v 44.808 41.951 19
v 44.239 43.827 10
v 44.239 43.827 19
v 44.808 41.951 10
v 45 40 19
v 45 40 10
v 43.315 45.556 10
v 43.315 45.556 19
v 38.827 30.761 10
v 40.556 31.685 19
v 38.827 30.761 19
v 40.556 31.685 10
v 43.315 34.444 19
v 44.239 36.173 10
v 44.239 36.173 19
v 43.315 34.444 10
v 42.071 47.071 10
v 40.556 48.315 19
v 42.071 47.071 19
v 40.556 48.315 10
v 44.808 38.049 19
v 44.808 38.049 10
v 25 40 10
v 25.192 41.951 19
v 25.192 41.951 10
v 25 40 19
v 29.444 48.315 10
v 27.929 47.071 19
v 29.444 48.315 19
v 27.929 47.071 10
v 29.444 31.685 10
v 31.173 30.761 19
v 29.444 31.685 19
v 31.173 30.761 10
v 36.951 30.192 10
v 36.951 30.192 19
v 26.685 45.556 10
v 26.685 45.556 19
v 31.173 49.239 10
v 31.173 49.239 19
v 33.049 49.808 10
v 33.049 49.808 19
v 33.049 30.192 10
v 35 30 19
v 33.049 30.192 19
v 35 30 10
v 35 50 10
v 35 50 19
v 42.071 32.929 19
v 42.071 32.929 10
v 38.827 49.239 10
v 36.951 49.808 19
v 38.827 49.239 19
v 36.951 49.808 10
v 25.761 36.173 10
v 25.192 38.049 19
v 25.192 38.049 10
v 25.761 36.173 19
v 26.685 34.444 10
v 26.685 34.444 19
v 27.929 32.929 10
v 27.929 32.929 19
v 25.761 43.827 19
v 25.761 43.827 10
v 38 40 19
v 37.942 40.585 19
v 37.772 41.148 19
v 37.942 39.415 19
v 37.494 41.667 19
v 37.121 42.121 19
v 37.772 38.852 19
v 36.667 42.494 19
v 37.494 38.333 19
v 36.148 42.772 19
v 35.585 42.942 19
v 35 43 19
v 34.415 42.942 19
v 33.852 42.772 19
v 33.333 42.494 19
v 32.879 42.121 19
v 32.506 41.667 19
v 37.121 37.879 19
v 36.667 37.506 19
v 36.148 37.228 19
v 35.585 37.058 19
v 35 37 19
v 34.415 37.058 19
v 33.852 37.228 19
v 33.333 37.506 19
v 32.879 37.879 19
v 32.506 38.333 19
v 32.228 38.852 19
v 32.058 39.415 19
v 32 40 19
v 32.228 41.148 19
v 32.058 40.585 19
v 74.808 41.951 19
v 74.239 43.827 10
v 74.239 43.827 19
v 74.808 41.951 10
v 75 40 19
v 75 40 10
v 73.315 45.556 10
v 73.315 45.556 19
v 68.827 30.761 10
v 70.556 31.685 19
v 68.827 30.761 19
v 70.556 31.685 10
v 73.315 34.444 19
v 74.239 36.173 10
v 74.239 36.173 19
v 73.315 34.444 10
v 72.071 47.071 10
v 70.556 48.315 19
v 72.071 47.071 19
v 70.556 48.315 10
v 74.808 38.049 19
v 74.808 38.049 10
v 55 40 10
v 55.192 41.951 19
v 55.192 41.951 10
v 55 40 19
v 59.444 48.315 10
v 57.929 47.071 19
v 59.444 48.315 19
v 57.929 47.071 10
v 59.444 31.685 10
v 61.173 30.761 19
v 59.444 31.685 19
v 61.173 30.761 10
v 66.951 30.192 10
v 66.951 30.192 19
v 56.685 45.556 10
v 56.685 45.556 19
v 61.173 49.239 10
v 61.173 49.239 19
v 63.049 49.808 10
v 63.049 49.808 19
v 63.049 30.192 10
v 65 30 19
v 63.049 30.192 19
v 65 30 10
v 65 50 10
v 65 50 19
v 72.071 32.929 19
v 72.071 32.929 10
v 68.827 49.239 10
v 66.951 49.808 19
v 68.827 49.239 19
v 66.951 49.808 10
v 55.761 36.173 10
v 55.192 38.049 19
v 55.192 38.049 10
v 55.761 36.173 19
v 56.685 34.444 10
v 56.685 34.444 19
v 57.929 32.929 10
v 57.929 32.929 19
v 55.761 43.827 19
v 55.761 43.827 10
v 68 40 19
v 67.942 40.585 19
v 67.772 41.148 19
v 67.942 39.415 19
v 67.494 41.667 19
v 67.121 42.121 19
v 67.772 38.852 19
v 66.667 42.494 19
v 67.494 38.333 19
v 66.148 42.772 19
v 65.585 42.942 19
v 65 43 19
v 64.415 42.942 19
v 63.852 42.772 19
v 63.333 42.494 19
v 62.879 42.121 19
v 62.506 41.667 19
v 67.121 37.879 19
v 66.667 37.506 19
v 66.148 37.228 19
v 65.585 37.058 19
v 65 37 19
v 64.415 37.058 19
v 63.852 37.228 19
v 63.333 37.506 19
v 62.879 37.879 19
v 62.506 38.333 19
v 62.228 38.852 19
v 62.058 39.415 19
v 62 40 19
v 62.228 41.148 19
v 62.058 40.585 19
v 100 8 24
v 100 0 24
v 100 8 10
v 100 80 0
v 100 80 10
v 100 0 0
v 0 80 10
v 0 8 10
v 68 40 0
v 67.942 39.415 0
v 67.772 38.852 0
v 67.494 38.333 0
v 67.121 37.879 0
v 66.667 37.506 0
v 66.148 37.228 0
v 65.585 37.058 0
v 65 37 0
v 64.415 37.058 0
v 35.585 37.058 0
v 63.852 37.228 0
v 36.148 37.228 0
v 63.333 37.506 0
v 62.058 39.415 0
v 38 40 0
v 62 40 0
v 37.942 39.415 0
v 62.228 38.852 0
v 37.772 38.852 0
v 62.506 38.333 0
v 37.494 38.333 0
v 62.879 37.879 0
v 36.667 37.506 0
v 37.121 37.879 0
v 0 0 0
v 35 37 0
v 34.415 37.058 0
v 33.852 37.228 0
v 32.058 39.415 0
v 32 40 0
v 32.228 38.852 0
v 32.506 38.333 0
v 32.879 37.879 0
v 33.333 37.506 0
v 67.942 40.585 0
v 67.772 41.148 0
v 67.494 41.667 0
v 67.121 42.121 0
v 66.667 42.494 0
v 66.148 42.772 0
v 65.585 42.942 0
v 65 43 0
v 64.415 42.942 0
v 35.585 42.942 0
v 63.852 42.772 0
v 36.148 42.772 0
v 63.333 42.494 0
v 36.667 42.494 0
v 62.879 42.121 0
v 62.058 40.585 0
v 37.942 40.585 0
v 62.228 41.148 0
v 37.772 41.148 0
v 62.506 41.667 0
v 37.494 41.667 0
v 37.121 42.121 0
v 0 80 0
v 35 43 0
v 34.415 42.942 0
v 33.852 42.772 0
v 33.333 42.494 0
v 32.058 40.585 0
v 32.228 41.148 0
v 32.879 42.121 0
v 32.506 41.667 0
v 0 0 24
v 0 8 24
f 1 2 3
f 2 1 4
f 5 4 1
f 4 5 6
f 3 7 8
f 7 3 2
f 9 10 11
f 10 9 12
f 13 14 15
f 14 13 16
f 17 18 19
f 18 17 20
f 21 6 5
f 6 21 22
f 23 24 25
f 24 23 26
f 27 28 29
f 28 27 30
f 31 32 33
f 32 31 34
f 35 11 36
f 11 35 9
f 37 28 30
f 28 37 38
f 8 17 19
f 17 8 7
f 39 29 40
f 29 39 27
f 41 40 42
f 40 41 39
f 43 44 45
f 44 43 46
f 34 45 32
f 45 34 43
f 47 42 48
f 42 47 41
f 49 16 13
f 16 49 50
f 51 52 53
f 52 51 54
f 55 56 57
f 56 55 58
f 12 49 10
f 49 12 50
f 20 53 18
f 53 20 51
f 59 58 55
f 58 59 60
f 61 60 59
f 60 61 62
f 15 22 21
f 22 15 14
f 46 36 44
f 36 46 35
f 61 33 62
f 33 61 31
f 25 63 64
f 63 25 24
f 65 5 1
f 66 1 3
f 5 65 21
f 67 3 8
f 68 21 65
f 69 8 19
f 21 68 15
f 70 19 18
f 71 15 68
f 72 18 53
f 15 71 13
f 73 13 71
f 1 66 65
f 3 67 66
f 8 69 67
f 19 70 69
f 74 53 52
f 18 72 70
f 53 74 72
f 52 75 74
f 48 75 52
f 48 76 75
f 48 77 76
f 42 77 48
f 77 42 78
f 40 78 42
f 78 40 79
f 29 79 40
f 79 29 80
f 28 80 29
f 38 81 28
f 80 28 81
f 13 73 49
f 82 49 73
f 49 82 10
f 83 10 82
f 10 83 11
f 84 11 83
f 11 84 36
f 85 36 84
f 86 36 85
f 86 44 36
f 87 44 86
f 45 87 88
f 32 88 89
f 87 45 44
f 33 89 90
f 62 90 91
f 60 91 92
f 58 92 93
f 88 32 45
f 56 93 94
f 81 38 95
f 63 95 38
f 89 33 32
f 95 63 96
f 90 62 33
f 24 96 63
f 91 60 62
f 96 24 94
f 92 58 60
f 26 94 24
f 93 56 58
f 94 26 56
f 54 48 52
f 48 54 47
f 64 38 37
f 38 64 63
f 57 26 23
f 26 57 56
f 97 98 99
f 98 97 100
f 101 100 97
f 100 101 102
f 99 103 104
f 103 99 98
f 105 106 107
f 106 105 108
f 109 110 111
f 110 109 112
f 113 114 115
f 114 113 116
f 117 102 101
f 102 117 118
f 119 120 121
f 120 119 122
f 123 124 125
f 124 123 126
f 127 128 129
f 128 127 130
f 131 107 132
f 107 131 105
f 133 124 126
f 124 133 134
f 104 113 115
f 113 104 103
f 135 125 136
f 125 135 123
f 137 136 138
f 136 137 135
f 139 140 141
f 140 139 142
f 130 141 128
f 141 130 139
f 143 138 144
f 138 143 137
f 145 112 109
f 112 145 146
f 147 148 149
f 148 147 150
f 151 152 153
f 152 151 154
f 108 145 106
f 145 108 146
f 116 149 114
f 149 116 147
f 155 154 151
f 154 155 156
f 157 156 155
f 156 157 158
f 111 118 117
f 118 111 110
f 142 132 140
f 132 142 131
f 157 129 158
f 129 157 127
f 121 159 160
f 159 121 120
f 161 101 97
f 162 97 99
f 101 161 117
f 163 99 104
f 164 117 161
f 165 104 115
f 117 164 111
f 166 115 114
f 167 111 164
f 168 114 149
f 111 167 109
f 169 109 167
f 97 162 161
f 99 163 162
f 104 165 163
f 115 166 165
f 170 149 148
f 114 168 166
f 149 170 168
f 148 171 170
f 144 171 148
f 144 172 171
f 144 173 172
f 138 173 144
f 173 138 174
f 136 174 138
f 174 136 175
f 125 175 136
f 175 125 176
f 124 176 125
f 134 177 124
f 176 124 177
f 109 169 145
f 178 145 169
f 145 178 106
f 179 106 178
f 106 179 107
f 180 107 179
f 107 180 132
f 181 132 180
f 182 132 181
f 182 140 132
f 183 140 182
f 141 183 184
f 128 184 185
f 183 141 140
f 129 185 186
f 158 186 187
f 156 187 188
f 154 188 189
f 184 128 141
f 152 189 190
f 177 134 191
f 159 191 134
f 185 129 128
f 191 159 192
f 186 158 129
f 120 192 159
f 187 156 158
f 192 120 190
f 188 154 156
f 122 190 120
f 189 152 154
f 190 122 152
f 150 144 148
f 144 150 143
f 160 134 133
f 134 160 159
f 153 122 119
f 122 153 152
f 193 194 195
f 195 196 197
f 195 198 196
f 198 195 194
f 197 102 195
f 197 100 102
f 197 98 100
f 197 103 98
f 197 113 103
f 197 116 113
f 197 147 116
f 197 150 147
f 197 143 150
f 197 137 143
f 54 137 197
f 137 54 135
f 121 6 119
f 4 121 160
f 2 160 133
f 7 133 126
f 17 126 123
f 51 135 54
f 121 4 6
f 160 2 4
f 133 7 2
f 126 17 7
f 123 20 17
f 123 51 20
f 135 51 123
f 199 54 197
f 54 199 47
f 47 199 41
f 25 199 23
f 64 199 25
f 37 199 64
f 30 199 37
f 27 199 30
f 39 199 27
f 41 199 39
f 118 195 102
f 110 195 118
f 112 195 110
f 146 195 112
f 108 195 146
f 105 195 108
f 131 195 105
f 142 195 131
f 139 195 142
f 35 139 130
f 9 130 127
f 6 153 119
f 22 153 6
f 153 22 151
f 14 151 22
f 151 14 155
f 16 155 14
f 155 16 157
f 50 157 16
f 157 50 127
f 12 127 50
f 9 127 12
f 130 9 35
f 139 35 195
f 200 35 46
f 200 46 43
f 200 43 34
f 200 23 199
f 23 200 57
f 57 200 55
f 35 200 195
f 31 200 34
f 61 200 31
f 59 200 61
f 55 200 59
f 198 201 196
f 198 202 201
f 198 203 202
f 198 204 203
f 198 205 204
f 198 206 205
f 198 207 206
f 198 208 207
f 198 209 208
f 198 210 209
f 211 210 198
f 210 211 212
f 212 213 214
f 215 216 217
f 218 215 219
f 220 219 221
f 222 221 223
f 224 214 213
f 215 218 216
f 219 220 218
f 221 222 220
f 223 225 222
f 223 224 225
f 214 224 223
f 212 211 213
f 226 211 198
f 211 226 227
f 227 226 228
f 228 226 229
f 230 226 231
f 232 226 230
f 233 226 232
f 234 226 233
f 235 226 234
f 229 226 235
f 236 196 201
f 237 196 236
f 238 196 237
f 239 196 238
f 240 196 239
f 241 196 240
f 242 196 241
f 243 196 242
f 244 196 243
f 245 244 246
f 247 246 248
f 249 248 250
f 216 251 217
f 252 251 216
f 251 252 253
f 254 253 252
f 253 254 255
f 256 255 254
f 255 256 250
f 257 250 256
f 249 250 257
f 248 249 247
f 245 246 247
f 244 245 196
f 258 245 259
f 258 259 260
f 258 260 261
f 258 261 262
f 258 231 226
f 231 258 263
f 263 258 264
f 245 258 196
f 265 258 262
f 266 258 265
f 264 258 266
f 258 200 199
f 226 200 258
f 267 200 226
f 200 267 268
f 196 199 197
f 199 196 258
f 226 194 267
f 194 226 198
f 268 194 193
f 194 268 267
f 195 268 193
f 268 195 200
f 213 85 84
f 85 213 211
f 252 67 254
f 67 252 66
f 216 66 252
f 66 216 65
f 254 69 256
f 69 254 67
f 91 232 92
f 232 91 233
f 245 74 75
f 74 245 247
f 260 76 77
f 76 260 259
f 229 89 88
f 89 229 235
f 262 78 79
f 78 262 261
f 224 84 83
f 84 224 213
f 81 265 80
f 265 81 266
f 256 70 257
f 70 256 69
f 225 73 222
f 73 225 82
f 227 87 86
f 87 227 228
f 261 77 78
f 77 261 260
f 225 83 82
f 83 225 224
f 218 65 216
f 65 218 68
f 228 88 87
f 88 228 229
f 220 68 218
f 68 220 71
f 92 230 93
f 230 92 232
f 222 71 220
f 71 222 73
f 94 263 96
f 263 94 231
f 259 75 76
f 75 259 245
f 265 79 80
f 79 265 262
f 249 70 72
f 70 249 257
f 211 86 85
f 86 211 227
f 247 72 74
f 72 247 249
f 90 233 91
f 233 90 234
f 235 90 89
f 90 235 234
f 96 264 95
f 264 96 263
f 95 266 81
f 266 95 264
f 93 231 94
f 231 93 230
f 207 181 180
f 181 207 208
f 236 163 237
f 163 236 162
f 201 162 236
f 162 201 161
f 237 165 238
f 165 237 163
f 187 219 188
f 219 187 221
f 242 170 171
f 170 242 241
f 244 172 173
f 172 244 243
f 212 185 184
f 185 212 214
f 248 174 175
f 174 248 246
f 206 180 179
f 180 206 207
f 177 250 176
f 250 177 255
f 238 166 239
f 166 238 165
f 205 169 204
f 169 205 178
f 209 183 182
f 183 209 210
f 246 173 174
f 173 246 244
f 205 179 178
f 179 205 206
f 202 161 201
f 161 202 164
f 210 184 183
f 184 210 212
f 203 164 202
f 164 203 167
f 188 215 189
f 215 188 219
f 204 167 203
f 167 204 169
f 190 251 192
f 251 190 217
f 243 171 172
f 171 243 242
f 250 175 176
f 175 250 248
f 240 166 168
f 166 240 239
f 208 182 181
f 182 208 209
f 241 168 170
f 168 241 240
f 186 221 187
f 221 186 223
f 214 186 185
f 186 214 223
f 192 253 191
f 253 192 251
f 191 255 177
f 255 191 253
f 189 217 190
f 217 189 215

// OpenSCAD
$fn = 32;

// ----------------------------------------------------------------------
// Drill jig: fence jig
// ----------------------------------------------------------------------

// --- parameters (mm) ---
plate_l = 100;            // plate length, X
plate_w = 80;             // plate width, Y
plate_t = 10;             // plate thickness
boss_d = 20;              // guide boss diameter
boss_h = 10;              // boss height above the plate
guide_d = 6;              // guide hole diameter
boss_pitch = 30;          // boss pitch
fence_h = 15;             // fence height above the plate
fence_t = 8;              // fence thickness

n_boss = 2;  // guide bosses
boss_x0 = (plate_l - (n_boss - 1) * boss_pitch) / 2;  // first boss X
boss_top = plate_t - 1 + boss_h;  // boss crown height
fence_top = plate_t - 1 + fence_h;  // fence crown height
total_h = max([fence_top, boss_top]);  // overall height

difference() {
  union() {
  cube([plate_l, plate_w, plate_t]);
  for (i = [0 : n_boss - 1])
    translate([boss_x0 + i * boss_pitch, plate_w / 2, plate_t - 1])
      cylinder(h = boss_h, d = boss_d);
  translate([0, 0, plate_t - 1]) cube([plate_l, fence_t, fence_h]);
  }
  for (i = [0 : n_boss - 1])
    translate([boss_x0 + i * boss_pitch, plate_w / 2, -1])
      cylinder(h = plate_t + boss_h, d = guide_d);
}
